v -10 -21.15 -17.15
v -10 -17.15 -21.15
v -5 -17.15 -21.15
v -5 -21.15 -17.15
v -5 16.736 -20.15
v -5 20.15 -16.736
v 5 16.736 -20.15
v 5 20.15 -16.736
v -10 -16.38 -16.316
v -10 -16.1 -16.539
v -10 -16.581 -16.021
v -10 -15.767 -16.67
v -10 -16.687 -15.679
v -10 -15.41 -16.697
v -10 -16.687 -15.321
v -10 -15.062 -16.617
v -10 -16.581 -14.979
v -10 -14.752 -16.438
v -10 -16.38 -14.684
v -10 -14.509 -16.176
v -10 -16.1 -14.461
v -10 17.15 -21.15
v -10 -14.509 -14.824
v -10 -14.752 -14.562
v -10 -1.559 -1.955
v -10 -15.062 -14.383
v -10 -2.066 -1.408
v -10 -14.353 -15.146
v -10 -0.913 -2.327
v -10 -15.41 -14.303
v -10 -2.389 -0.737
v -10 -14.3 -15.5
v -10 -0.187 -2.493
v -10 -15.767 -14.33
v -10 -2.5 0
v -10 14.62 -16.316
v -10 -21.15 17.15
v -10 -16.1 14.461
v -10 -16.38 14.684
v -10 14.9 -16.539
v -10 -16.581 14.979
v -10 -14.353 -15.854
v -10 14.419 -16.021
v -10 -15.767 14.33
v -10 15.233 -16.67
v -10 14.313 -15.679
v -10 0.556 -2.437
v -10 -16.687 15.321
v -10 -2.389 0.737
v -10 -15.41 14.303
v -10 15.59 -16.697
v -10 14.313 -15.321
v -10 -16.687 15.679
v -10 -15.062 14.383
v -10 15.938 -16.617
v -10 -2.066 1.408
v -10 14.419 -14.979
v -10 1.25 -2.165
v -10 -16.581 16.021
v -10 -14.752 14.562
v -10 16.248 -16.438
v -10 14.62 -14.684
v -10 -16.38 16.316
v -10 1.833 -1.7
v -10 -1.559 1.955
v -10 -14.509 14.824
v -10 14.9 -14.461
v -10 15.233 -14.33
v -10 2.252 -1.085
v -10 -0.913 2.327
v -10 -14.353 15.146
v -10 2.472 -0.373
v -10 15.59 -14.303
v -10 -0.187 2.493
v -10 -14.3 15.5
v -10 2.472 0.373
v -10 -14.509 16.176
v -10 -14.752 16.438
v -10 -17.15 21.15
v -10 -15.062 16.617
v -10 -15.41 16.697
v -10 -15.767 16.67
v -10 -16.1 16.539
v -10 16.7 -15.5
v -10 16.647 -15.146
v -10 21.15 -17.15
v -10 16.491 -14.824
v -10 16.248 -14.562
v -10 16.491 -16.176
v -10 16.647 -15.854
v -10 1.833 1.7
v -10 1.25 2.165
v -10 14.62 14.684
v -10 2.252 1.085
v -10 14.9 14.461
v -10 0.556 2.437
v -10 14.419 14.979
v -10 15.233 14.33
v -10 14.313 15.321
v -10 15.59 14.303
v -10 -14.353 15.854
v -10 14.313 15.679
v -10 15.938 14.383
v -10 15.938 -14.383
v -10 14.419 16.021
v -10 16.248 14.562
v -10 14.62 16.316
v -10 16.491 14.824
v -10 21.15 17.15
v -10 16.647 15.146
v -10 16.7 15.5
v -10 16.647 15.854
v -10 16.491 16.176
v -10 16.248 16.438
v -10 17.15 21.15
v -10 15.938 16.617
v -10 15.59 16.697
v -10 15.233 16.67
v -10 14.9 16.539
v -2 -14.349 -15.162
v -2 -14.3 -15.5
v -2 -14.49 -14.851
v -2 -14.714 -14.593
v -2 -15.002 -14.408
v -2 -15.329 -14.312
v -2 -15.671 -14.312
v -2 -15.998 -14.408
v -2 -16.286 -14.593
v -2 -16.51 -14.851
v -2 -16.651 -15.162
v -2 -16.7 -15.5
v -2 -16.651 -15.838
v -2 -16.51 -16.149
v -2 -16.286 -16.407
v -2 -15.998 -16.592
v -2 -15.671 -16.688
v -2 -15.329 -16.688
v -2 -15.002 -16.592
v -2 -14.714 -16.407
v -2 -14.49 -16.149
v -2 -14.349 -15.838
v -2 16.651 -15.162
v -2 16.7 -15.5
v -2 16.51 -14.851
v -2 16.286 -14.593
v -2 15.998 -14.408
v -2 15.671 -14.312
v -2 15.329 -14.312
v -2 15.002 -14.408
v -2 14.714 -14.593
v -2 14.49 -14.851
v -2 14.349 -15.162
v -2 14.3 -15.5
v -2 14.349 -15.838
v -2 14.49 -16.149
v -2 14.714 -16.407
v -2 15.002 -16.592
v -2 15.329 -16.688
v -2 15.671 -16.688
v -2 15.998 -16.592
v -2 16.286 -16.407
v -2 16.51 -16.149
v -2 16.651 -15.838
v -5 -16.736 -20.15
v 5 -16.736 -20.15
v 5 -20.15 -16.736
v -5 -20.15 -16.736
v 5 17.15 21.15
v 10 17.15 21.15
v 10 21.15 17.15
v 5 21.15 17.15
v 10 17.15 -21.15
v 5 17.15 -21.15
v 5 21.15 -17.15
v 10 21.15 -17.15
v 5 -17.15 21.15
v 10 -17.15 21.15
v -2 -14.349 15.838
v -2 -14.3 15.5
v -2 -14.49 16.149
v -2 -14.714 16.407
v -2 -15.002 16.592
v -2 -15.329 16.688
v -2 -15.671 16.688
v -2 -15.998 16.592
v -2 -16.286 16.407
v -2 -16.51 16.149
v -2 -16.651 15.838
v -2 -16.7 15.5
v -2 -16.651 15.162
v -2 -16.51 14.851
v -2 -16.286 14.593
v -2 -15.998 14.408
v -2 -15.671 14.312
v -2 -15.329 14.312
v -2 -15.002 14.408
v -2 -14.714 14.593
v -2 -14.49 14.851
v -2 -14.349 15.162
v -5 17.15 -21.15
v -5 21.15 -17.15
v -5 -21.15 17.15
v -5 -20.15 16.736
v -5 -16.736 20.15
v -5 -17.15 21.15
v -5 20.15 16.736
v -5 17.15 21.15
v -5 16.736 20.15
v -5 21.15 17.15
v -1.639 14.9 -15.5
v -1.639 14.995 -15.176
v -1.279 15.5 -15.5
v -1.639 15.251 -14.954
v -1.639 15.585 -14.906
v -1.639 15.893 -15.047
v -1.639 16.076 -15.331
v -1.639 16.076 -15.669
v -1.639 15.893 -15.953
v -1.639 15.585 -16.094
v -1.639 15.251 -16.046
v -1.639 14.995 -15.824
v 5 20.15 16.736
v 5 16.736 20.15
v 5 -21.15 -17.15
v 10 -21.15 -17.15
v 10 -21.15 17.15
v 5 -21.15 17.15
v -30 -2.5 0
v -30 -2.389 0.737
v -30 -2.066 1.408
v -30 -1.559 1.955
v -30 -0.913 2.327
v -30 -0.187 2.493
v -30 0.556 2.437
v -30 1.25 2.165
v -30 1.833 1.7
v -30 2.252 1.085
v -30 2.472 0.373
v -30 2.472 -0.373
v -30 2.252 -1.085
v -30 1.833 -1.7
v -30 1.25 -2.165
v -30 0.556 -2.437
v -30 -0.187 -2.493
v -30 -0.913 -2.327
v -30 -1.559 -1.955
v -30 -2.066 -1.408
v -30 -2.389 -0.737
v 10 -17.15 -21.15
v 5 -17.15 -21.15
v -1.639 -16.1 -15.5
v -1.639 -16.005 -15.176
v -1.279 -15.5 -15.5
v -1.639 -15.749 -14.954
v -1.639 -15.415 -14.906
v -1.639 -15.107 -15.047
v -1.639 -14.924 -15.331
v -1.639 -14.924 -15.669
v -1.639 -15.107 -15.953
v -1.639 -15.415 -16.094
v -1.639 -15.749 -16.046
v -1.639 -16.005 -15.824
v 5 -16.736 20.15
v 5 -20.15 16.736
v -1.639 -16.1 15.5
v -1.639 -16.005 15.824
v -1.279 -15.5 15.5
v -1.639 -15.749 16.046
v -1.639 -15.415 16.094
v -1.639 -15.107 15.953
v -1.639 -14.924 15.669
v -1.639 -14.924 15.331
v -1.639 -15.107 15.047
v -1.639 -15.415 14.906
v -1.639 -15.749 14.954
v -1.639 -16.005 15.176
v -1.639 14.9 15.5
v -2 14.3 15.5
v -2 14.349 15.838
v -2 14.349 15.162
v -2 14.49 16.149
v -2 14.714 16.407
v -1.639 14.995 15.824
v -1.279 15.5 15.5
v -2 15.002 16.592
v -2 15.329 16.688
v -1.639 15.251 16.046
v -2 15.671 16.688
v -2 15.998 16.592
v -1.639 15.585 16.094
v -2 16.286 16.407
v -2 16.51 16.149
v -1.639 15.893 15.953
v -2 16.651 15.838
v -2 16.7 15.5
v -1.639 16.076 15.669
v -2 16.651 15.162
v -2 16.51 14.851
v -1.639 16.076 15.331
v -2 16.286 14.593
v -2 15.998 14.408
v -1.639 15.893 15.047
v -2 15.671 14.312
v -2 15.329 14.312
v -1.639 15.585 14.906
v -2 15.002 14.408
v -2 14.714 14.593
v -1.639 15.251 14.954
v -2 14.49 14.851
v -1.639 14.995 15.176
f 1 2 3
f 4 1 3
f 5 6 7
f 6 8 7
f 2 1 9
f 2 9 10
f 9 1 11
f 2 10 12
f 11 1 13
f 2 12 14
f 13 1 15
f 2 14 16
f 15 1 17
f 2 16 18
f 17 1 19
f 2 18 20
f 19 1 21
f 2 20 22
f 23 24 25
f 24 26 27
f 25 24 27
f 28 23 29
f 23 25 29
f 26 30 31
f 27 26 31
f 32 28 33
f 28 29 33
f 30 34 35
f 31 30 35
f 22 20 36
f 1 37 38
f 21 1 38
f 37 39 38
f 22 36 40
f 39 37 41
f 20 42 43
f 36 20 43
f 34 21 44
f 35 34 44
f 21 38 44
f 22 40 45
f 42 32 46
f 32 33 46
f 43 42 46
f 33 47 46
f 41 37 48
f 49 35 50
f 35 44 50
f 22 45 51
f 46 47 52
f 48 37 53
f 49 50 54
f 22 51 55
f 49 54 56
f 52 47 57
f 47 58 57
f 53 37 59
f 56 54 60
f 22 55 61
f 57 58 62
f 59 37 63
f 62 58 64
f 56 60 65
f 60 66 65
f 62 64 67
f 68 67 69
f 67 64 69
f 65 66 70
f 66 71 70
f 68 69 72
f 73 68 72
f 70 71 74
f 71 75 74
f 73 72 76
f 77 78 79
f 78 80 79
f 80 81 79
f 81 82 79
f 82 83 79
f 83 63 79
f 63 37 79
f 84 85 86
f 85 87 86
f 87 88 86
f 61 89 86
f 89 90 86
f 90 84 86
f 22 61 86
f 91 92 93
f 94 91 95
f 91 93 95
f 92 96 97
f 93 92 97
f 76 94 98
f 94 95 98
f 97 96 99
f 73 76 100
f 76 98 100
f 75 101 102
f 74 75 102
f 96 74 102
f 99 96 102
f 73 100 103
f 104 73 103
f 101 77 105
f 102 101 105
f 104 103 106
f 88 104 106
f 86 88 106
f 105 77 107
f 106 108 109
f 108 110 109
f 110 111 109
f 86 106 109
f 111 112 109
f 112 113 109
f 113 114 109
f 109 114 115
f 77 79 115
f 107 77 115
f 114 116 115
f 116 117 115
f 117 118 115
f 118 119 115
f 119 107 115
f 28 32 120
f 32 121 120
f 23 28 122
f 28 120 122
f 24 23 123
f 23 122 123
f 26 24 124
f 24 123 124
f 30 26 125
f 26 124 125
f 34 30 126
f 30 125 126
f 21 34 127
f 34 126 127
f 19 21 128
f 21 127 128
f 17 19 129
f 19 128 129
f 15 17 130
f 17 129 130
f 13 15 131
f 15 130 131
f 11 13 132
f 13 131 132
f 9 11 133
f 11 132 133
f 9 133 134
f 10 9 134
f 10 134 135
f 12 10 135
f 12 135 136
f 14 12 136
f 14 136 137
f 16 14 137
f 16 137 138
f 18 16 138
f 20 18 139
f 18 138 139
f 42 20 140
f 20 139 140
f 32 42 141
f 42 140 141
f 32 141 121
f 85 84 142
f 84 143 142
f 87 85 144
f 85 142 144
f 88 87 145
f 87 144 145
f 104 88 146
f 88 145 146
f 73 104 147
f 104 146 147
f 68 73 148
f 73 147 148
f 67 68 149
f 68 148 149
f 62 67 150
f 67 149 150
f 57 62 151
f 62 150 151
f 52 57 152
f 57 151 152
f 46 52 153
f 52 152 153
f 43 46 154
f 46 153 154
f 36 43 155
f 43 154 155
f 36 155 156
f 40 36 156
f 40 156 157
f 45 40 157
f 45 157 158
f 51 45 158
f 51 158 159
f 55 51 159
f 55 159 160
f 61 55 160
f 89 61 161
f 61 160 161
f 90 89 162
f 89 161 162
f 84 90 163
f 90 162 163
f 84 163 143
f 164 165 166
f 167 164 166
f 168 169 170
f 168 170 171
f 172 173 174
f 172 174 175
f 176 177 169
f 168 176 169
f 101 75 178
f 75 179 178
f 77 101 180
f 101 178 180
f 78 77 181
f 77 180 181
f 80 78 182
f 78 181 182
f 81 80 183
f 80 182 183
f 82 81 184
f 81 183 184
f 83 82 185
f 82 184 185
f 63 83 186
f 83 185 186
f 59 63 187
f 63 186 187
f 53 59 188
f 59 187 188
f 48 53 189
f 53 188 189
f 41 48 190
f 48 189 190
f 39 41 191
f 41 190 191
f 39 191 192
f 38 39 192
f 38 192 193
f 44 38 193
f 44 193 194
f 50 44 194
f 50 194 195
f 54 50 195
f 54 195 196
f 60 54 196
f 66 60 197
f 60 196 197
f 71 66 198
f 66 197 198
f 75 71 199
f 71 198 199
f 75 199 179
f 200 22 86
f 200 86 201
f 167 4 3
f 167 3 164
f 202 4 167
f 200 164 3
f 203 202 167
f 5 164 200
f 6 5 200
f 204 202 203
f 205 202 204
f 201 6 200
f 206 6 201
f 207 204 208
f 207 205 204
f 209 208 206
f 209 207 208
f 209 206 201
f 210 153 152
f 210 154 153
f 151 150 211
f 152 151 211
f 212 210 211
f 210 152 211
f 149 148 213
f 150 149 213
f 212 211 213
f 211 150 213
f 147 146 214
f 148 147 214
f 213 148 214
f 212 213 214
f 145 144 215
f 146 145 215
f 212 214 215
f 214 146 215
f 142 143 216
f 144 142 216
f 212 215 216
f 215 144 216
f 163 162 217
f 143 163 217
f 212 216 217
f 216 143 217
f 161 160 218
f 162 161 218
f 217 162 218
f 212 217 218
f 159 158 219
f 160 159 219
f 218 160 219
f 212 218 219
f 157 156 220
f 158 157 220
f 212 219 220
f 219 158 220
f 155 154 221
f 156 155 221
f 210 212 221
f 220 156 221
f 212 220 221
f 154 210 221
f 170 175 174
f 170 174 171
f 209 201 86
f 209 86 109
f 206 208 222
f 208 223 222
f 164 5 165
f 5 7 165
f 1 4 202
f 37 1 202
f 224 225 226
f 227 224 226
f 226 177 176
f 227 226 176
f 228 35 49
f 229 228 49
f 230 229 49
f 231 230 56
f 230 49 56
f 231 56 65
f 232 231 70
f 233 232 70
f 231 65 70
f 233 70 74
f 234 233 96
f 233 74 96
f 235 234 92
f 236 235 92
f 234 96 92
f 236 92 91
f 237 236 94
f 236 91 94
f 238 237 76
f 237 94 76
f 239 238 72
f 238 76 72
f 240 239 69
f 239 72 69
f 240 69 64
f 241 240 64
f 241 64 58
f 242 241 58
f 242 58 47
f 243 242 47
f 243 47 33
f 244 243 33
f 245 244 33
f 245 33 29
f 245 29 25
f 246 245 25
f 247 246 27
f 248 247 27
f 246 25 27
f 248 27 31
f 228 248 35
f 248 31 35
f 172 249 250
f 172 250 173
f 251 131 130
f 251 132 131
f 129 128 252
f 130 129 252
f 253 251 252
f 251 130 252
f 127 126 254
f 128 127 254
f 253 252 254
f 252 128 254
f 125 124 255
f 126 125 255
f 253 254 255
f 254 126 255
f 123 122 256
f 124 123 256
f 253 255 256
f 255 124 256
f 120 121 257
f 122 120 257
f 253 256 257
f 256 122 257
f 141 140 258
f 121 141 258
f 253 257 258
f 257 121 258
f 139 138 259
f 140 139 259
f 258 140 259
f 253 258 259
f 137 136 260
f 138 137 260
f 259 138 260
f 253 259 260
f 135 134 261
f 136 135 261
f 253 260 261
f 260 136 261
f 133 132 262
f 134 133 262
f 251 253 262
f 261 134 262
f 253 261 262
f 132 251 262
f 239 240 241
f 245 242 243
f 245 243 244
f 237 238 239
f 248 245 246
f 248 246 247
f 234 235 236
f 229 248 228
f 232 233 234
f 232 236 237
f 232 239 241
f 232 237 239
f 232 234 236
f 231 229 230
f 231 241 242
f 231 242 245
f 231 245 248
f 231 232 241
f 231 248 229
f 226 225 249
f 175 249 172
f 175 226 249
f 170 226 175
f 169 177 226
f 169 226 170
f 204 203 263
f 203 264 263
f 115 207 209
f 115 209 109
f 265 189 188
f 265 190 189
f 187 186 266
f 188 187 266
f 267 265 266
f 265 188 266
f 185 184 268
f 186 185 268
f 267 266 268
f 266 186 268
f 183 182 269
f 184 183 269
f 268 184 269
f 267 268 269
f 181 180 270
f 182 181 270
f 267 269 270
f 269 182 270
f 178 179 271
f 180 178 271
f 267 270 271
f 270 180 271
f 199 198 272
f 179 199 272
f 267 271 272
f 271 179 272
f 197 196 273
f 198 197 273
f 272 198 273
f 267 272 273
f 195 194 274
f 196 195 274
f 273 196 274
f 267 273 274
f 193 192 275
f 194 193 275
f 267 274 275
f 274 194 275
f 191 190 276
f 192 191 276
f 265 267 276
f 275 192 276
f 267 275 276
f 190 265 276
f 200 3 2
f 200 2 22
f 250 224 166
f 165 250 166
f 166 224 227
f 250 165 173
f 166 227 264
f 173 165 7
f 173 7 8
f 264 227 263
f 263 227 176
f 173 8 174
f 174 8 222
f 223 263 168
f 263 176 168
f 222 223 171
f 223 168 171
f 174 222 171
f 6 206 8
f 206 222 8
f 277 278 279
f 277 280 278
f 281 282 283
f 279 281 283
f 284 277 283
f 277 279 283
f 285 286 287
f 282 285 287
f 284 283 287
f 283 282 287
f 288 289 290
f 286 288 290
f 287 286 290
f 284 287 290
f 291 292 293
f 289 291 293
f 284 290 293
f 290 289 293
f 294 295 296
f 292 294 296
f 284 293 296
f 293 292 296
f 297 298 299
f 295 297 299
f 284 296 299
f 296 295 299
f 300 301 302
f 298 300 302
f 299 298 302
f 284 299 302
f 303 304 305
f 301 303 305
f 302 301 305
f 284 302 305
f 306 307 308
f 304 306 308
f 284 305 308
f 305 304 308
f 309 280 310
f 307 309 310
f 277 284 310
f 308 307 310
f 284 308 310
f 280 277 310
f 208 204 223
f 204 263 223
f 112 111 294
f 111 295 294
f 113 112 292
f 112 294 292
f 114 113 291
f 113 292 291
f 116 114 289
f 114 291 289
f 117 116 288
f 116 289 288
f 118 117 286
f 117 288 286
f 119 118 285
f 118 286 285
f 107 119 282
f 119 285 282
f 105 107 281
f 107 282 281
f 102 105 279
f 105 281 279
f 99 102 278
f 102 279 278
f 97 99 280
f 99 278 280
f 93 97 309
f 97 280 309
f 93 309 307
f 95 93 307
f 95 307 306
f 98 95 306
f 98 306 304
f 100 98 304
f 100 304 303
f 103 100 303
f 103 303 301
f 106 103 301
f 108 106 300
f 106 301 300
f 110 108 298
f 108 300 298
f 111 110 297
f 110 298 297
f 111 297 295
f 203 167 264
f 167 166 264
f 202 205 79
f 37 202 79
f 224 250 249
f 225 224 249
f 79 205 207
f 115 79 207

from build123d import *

# Parameters (mm, degrees)
F0_W     = 42.3
F0_H     = 42.3
F1_DEPTH = 10
F2_SIZE  = 4
F3_W     = 43
F3_H     = 43
F4_DEPTH = 5
F5_R     = 2.5
F6_DEPTH = 20
F8_D     = 2.4
F8_DEPTH = 8
F8_TIP   = 0.7210327428


with BuildPart() as f1:
    # F0 (on Right) → F1 (new body, symmetric)
    with BuildSketch(Plane.YZ):
        Rectangle(F0_W, F0_H)
    extrude(amount=F1_DEPTH, both=True)

    # F2
    f2_edges = [f1.edges().sort_by_distance(p)[0] for p in [
        (0, -21.15, 21.15),
        (0, 21.15, 21.15),
        (0, -21.15, -21.15),
        (0, 21.15, -21.15),
    ]]
    chamfer(f2_edges, length=F2_SIZE)

    # F3 (on Right) → F4 (cut, symmetric)
    with BuildSketch(Plane.YZ):
        Rectangle(F3_W, F3_H)
        Polygon((-16.7357864376, -20.15), (-20.15, -16.7357864376), (-20.15, 16.7357864376), (-16.7357864376, 20.15), (16.7357864376, 20.15), (20.15, 16.7357864376), (20.15, -16.7357864376), (16.7357864376, -20.15), align=None, mode=Mode.SUBTRACT)
    extrude(amount=F4_DEPTH, both=True, mode=Mode.SUBTRACT)

    # F5 (on face) → F6 (join)
    with BuildSketch(Plane(origin=(-10, 0, 0), x_dir=(0, -1, 0), z_dir=(-1, 0, 0))):
        Circle(F5_R)
    extrude(amount=F6_DEPTH)

    # F8
    with Locations(Plane(origin=(-10, 0, 0), x_dir=(0, -1, 0), z_dir=(-1, 0, 0))):
        with Locations((-15.5, 15.5), (15.5, 15.5), (-15.5, -15.5), (15.5, -15.5)):
            Hole(F8_D / 2, depth=F8_DEPTH)
            with Locations((0, 0, -(F8_DEPTH + F8_TIP / 2))):  # 118° drill point
                Cone(0, F8_D / 2, F8_TIP, mode=Mode.SUBTRACT)


solid = f1.part
